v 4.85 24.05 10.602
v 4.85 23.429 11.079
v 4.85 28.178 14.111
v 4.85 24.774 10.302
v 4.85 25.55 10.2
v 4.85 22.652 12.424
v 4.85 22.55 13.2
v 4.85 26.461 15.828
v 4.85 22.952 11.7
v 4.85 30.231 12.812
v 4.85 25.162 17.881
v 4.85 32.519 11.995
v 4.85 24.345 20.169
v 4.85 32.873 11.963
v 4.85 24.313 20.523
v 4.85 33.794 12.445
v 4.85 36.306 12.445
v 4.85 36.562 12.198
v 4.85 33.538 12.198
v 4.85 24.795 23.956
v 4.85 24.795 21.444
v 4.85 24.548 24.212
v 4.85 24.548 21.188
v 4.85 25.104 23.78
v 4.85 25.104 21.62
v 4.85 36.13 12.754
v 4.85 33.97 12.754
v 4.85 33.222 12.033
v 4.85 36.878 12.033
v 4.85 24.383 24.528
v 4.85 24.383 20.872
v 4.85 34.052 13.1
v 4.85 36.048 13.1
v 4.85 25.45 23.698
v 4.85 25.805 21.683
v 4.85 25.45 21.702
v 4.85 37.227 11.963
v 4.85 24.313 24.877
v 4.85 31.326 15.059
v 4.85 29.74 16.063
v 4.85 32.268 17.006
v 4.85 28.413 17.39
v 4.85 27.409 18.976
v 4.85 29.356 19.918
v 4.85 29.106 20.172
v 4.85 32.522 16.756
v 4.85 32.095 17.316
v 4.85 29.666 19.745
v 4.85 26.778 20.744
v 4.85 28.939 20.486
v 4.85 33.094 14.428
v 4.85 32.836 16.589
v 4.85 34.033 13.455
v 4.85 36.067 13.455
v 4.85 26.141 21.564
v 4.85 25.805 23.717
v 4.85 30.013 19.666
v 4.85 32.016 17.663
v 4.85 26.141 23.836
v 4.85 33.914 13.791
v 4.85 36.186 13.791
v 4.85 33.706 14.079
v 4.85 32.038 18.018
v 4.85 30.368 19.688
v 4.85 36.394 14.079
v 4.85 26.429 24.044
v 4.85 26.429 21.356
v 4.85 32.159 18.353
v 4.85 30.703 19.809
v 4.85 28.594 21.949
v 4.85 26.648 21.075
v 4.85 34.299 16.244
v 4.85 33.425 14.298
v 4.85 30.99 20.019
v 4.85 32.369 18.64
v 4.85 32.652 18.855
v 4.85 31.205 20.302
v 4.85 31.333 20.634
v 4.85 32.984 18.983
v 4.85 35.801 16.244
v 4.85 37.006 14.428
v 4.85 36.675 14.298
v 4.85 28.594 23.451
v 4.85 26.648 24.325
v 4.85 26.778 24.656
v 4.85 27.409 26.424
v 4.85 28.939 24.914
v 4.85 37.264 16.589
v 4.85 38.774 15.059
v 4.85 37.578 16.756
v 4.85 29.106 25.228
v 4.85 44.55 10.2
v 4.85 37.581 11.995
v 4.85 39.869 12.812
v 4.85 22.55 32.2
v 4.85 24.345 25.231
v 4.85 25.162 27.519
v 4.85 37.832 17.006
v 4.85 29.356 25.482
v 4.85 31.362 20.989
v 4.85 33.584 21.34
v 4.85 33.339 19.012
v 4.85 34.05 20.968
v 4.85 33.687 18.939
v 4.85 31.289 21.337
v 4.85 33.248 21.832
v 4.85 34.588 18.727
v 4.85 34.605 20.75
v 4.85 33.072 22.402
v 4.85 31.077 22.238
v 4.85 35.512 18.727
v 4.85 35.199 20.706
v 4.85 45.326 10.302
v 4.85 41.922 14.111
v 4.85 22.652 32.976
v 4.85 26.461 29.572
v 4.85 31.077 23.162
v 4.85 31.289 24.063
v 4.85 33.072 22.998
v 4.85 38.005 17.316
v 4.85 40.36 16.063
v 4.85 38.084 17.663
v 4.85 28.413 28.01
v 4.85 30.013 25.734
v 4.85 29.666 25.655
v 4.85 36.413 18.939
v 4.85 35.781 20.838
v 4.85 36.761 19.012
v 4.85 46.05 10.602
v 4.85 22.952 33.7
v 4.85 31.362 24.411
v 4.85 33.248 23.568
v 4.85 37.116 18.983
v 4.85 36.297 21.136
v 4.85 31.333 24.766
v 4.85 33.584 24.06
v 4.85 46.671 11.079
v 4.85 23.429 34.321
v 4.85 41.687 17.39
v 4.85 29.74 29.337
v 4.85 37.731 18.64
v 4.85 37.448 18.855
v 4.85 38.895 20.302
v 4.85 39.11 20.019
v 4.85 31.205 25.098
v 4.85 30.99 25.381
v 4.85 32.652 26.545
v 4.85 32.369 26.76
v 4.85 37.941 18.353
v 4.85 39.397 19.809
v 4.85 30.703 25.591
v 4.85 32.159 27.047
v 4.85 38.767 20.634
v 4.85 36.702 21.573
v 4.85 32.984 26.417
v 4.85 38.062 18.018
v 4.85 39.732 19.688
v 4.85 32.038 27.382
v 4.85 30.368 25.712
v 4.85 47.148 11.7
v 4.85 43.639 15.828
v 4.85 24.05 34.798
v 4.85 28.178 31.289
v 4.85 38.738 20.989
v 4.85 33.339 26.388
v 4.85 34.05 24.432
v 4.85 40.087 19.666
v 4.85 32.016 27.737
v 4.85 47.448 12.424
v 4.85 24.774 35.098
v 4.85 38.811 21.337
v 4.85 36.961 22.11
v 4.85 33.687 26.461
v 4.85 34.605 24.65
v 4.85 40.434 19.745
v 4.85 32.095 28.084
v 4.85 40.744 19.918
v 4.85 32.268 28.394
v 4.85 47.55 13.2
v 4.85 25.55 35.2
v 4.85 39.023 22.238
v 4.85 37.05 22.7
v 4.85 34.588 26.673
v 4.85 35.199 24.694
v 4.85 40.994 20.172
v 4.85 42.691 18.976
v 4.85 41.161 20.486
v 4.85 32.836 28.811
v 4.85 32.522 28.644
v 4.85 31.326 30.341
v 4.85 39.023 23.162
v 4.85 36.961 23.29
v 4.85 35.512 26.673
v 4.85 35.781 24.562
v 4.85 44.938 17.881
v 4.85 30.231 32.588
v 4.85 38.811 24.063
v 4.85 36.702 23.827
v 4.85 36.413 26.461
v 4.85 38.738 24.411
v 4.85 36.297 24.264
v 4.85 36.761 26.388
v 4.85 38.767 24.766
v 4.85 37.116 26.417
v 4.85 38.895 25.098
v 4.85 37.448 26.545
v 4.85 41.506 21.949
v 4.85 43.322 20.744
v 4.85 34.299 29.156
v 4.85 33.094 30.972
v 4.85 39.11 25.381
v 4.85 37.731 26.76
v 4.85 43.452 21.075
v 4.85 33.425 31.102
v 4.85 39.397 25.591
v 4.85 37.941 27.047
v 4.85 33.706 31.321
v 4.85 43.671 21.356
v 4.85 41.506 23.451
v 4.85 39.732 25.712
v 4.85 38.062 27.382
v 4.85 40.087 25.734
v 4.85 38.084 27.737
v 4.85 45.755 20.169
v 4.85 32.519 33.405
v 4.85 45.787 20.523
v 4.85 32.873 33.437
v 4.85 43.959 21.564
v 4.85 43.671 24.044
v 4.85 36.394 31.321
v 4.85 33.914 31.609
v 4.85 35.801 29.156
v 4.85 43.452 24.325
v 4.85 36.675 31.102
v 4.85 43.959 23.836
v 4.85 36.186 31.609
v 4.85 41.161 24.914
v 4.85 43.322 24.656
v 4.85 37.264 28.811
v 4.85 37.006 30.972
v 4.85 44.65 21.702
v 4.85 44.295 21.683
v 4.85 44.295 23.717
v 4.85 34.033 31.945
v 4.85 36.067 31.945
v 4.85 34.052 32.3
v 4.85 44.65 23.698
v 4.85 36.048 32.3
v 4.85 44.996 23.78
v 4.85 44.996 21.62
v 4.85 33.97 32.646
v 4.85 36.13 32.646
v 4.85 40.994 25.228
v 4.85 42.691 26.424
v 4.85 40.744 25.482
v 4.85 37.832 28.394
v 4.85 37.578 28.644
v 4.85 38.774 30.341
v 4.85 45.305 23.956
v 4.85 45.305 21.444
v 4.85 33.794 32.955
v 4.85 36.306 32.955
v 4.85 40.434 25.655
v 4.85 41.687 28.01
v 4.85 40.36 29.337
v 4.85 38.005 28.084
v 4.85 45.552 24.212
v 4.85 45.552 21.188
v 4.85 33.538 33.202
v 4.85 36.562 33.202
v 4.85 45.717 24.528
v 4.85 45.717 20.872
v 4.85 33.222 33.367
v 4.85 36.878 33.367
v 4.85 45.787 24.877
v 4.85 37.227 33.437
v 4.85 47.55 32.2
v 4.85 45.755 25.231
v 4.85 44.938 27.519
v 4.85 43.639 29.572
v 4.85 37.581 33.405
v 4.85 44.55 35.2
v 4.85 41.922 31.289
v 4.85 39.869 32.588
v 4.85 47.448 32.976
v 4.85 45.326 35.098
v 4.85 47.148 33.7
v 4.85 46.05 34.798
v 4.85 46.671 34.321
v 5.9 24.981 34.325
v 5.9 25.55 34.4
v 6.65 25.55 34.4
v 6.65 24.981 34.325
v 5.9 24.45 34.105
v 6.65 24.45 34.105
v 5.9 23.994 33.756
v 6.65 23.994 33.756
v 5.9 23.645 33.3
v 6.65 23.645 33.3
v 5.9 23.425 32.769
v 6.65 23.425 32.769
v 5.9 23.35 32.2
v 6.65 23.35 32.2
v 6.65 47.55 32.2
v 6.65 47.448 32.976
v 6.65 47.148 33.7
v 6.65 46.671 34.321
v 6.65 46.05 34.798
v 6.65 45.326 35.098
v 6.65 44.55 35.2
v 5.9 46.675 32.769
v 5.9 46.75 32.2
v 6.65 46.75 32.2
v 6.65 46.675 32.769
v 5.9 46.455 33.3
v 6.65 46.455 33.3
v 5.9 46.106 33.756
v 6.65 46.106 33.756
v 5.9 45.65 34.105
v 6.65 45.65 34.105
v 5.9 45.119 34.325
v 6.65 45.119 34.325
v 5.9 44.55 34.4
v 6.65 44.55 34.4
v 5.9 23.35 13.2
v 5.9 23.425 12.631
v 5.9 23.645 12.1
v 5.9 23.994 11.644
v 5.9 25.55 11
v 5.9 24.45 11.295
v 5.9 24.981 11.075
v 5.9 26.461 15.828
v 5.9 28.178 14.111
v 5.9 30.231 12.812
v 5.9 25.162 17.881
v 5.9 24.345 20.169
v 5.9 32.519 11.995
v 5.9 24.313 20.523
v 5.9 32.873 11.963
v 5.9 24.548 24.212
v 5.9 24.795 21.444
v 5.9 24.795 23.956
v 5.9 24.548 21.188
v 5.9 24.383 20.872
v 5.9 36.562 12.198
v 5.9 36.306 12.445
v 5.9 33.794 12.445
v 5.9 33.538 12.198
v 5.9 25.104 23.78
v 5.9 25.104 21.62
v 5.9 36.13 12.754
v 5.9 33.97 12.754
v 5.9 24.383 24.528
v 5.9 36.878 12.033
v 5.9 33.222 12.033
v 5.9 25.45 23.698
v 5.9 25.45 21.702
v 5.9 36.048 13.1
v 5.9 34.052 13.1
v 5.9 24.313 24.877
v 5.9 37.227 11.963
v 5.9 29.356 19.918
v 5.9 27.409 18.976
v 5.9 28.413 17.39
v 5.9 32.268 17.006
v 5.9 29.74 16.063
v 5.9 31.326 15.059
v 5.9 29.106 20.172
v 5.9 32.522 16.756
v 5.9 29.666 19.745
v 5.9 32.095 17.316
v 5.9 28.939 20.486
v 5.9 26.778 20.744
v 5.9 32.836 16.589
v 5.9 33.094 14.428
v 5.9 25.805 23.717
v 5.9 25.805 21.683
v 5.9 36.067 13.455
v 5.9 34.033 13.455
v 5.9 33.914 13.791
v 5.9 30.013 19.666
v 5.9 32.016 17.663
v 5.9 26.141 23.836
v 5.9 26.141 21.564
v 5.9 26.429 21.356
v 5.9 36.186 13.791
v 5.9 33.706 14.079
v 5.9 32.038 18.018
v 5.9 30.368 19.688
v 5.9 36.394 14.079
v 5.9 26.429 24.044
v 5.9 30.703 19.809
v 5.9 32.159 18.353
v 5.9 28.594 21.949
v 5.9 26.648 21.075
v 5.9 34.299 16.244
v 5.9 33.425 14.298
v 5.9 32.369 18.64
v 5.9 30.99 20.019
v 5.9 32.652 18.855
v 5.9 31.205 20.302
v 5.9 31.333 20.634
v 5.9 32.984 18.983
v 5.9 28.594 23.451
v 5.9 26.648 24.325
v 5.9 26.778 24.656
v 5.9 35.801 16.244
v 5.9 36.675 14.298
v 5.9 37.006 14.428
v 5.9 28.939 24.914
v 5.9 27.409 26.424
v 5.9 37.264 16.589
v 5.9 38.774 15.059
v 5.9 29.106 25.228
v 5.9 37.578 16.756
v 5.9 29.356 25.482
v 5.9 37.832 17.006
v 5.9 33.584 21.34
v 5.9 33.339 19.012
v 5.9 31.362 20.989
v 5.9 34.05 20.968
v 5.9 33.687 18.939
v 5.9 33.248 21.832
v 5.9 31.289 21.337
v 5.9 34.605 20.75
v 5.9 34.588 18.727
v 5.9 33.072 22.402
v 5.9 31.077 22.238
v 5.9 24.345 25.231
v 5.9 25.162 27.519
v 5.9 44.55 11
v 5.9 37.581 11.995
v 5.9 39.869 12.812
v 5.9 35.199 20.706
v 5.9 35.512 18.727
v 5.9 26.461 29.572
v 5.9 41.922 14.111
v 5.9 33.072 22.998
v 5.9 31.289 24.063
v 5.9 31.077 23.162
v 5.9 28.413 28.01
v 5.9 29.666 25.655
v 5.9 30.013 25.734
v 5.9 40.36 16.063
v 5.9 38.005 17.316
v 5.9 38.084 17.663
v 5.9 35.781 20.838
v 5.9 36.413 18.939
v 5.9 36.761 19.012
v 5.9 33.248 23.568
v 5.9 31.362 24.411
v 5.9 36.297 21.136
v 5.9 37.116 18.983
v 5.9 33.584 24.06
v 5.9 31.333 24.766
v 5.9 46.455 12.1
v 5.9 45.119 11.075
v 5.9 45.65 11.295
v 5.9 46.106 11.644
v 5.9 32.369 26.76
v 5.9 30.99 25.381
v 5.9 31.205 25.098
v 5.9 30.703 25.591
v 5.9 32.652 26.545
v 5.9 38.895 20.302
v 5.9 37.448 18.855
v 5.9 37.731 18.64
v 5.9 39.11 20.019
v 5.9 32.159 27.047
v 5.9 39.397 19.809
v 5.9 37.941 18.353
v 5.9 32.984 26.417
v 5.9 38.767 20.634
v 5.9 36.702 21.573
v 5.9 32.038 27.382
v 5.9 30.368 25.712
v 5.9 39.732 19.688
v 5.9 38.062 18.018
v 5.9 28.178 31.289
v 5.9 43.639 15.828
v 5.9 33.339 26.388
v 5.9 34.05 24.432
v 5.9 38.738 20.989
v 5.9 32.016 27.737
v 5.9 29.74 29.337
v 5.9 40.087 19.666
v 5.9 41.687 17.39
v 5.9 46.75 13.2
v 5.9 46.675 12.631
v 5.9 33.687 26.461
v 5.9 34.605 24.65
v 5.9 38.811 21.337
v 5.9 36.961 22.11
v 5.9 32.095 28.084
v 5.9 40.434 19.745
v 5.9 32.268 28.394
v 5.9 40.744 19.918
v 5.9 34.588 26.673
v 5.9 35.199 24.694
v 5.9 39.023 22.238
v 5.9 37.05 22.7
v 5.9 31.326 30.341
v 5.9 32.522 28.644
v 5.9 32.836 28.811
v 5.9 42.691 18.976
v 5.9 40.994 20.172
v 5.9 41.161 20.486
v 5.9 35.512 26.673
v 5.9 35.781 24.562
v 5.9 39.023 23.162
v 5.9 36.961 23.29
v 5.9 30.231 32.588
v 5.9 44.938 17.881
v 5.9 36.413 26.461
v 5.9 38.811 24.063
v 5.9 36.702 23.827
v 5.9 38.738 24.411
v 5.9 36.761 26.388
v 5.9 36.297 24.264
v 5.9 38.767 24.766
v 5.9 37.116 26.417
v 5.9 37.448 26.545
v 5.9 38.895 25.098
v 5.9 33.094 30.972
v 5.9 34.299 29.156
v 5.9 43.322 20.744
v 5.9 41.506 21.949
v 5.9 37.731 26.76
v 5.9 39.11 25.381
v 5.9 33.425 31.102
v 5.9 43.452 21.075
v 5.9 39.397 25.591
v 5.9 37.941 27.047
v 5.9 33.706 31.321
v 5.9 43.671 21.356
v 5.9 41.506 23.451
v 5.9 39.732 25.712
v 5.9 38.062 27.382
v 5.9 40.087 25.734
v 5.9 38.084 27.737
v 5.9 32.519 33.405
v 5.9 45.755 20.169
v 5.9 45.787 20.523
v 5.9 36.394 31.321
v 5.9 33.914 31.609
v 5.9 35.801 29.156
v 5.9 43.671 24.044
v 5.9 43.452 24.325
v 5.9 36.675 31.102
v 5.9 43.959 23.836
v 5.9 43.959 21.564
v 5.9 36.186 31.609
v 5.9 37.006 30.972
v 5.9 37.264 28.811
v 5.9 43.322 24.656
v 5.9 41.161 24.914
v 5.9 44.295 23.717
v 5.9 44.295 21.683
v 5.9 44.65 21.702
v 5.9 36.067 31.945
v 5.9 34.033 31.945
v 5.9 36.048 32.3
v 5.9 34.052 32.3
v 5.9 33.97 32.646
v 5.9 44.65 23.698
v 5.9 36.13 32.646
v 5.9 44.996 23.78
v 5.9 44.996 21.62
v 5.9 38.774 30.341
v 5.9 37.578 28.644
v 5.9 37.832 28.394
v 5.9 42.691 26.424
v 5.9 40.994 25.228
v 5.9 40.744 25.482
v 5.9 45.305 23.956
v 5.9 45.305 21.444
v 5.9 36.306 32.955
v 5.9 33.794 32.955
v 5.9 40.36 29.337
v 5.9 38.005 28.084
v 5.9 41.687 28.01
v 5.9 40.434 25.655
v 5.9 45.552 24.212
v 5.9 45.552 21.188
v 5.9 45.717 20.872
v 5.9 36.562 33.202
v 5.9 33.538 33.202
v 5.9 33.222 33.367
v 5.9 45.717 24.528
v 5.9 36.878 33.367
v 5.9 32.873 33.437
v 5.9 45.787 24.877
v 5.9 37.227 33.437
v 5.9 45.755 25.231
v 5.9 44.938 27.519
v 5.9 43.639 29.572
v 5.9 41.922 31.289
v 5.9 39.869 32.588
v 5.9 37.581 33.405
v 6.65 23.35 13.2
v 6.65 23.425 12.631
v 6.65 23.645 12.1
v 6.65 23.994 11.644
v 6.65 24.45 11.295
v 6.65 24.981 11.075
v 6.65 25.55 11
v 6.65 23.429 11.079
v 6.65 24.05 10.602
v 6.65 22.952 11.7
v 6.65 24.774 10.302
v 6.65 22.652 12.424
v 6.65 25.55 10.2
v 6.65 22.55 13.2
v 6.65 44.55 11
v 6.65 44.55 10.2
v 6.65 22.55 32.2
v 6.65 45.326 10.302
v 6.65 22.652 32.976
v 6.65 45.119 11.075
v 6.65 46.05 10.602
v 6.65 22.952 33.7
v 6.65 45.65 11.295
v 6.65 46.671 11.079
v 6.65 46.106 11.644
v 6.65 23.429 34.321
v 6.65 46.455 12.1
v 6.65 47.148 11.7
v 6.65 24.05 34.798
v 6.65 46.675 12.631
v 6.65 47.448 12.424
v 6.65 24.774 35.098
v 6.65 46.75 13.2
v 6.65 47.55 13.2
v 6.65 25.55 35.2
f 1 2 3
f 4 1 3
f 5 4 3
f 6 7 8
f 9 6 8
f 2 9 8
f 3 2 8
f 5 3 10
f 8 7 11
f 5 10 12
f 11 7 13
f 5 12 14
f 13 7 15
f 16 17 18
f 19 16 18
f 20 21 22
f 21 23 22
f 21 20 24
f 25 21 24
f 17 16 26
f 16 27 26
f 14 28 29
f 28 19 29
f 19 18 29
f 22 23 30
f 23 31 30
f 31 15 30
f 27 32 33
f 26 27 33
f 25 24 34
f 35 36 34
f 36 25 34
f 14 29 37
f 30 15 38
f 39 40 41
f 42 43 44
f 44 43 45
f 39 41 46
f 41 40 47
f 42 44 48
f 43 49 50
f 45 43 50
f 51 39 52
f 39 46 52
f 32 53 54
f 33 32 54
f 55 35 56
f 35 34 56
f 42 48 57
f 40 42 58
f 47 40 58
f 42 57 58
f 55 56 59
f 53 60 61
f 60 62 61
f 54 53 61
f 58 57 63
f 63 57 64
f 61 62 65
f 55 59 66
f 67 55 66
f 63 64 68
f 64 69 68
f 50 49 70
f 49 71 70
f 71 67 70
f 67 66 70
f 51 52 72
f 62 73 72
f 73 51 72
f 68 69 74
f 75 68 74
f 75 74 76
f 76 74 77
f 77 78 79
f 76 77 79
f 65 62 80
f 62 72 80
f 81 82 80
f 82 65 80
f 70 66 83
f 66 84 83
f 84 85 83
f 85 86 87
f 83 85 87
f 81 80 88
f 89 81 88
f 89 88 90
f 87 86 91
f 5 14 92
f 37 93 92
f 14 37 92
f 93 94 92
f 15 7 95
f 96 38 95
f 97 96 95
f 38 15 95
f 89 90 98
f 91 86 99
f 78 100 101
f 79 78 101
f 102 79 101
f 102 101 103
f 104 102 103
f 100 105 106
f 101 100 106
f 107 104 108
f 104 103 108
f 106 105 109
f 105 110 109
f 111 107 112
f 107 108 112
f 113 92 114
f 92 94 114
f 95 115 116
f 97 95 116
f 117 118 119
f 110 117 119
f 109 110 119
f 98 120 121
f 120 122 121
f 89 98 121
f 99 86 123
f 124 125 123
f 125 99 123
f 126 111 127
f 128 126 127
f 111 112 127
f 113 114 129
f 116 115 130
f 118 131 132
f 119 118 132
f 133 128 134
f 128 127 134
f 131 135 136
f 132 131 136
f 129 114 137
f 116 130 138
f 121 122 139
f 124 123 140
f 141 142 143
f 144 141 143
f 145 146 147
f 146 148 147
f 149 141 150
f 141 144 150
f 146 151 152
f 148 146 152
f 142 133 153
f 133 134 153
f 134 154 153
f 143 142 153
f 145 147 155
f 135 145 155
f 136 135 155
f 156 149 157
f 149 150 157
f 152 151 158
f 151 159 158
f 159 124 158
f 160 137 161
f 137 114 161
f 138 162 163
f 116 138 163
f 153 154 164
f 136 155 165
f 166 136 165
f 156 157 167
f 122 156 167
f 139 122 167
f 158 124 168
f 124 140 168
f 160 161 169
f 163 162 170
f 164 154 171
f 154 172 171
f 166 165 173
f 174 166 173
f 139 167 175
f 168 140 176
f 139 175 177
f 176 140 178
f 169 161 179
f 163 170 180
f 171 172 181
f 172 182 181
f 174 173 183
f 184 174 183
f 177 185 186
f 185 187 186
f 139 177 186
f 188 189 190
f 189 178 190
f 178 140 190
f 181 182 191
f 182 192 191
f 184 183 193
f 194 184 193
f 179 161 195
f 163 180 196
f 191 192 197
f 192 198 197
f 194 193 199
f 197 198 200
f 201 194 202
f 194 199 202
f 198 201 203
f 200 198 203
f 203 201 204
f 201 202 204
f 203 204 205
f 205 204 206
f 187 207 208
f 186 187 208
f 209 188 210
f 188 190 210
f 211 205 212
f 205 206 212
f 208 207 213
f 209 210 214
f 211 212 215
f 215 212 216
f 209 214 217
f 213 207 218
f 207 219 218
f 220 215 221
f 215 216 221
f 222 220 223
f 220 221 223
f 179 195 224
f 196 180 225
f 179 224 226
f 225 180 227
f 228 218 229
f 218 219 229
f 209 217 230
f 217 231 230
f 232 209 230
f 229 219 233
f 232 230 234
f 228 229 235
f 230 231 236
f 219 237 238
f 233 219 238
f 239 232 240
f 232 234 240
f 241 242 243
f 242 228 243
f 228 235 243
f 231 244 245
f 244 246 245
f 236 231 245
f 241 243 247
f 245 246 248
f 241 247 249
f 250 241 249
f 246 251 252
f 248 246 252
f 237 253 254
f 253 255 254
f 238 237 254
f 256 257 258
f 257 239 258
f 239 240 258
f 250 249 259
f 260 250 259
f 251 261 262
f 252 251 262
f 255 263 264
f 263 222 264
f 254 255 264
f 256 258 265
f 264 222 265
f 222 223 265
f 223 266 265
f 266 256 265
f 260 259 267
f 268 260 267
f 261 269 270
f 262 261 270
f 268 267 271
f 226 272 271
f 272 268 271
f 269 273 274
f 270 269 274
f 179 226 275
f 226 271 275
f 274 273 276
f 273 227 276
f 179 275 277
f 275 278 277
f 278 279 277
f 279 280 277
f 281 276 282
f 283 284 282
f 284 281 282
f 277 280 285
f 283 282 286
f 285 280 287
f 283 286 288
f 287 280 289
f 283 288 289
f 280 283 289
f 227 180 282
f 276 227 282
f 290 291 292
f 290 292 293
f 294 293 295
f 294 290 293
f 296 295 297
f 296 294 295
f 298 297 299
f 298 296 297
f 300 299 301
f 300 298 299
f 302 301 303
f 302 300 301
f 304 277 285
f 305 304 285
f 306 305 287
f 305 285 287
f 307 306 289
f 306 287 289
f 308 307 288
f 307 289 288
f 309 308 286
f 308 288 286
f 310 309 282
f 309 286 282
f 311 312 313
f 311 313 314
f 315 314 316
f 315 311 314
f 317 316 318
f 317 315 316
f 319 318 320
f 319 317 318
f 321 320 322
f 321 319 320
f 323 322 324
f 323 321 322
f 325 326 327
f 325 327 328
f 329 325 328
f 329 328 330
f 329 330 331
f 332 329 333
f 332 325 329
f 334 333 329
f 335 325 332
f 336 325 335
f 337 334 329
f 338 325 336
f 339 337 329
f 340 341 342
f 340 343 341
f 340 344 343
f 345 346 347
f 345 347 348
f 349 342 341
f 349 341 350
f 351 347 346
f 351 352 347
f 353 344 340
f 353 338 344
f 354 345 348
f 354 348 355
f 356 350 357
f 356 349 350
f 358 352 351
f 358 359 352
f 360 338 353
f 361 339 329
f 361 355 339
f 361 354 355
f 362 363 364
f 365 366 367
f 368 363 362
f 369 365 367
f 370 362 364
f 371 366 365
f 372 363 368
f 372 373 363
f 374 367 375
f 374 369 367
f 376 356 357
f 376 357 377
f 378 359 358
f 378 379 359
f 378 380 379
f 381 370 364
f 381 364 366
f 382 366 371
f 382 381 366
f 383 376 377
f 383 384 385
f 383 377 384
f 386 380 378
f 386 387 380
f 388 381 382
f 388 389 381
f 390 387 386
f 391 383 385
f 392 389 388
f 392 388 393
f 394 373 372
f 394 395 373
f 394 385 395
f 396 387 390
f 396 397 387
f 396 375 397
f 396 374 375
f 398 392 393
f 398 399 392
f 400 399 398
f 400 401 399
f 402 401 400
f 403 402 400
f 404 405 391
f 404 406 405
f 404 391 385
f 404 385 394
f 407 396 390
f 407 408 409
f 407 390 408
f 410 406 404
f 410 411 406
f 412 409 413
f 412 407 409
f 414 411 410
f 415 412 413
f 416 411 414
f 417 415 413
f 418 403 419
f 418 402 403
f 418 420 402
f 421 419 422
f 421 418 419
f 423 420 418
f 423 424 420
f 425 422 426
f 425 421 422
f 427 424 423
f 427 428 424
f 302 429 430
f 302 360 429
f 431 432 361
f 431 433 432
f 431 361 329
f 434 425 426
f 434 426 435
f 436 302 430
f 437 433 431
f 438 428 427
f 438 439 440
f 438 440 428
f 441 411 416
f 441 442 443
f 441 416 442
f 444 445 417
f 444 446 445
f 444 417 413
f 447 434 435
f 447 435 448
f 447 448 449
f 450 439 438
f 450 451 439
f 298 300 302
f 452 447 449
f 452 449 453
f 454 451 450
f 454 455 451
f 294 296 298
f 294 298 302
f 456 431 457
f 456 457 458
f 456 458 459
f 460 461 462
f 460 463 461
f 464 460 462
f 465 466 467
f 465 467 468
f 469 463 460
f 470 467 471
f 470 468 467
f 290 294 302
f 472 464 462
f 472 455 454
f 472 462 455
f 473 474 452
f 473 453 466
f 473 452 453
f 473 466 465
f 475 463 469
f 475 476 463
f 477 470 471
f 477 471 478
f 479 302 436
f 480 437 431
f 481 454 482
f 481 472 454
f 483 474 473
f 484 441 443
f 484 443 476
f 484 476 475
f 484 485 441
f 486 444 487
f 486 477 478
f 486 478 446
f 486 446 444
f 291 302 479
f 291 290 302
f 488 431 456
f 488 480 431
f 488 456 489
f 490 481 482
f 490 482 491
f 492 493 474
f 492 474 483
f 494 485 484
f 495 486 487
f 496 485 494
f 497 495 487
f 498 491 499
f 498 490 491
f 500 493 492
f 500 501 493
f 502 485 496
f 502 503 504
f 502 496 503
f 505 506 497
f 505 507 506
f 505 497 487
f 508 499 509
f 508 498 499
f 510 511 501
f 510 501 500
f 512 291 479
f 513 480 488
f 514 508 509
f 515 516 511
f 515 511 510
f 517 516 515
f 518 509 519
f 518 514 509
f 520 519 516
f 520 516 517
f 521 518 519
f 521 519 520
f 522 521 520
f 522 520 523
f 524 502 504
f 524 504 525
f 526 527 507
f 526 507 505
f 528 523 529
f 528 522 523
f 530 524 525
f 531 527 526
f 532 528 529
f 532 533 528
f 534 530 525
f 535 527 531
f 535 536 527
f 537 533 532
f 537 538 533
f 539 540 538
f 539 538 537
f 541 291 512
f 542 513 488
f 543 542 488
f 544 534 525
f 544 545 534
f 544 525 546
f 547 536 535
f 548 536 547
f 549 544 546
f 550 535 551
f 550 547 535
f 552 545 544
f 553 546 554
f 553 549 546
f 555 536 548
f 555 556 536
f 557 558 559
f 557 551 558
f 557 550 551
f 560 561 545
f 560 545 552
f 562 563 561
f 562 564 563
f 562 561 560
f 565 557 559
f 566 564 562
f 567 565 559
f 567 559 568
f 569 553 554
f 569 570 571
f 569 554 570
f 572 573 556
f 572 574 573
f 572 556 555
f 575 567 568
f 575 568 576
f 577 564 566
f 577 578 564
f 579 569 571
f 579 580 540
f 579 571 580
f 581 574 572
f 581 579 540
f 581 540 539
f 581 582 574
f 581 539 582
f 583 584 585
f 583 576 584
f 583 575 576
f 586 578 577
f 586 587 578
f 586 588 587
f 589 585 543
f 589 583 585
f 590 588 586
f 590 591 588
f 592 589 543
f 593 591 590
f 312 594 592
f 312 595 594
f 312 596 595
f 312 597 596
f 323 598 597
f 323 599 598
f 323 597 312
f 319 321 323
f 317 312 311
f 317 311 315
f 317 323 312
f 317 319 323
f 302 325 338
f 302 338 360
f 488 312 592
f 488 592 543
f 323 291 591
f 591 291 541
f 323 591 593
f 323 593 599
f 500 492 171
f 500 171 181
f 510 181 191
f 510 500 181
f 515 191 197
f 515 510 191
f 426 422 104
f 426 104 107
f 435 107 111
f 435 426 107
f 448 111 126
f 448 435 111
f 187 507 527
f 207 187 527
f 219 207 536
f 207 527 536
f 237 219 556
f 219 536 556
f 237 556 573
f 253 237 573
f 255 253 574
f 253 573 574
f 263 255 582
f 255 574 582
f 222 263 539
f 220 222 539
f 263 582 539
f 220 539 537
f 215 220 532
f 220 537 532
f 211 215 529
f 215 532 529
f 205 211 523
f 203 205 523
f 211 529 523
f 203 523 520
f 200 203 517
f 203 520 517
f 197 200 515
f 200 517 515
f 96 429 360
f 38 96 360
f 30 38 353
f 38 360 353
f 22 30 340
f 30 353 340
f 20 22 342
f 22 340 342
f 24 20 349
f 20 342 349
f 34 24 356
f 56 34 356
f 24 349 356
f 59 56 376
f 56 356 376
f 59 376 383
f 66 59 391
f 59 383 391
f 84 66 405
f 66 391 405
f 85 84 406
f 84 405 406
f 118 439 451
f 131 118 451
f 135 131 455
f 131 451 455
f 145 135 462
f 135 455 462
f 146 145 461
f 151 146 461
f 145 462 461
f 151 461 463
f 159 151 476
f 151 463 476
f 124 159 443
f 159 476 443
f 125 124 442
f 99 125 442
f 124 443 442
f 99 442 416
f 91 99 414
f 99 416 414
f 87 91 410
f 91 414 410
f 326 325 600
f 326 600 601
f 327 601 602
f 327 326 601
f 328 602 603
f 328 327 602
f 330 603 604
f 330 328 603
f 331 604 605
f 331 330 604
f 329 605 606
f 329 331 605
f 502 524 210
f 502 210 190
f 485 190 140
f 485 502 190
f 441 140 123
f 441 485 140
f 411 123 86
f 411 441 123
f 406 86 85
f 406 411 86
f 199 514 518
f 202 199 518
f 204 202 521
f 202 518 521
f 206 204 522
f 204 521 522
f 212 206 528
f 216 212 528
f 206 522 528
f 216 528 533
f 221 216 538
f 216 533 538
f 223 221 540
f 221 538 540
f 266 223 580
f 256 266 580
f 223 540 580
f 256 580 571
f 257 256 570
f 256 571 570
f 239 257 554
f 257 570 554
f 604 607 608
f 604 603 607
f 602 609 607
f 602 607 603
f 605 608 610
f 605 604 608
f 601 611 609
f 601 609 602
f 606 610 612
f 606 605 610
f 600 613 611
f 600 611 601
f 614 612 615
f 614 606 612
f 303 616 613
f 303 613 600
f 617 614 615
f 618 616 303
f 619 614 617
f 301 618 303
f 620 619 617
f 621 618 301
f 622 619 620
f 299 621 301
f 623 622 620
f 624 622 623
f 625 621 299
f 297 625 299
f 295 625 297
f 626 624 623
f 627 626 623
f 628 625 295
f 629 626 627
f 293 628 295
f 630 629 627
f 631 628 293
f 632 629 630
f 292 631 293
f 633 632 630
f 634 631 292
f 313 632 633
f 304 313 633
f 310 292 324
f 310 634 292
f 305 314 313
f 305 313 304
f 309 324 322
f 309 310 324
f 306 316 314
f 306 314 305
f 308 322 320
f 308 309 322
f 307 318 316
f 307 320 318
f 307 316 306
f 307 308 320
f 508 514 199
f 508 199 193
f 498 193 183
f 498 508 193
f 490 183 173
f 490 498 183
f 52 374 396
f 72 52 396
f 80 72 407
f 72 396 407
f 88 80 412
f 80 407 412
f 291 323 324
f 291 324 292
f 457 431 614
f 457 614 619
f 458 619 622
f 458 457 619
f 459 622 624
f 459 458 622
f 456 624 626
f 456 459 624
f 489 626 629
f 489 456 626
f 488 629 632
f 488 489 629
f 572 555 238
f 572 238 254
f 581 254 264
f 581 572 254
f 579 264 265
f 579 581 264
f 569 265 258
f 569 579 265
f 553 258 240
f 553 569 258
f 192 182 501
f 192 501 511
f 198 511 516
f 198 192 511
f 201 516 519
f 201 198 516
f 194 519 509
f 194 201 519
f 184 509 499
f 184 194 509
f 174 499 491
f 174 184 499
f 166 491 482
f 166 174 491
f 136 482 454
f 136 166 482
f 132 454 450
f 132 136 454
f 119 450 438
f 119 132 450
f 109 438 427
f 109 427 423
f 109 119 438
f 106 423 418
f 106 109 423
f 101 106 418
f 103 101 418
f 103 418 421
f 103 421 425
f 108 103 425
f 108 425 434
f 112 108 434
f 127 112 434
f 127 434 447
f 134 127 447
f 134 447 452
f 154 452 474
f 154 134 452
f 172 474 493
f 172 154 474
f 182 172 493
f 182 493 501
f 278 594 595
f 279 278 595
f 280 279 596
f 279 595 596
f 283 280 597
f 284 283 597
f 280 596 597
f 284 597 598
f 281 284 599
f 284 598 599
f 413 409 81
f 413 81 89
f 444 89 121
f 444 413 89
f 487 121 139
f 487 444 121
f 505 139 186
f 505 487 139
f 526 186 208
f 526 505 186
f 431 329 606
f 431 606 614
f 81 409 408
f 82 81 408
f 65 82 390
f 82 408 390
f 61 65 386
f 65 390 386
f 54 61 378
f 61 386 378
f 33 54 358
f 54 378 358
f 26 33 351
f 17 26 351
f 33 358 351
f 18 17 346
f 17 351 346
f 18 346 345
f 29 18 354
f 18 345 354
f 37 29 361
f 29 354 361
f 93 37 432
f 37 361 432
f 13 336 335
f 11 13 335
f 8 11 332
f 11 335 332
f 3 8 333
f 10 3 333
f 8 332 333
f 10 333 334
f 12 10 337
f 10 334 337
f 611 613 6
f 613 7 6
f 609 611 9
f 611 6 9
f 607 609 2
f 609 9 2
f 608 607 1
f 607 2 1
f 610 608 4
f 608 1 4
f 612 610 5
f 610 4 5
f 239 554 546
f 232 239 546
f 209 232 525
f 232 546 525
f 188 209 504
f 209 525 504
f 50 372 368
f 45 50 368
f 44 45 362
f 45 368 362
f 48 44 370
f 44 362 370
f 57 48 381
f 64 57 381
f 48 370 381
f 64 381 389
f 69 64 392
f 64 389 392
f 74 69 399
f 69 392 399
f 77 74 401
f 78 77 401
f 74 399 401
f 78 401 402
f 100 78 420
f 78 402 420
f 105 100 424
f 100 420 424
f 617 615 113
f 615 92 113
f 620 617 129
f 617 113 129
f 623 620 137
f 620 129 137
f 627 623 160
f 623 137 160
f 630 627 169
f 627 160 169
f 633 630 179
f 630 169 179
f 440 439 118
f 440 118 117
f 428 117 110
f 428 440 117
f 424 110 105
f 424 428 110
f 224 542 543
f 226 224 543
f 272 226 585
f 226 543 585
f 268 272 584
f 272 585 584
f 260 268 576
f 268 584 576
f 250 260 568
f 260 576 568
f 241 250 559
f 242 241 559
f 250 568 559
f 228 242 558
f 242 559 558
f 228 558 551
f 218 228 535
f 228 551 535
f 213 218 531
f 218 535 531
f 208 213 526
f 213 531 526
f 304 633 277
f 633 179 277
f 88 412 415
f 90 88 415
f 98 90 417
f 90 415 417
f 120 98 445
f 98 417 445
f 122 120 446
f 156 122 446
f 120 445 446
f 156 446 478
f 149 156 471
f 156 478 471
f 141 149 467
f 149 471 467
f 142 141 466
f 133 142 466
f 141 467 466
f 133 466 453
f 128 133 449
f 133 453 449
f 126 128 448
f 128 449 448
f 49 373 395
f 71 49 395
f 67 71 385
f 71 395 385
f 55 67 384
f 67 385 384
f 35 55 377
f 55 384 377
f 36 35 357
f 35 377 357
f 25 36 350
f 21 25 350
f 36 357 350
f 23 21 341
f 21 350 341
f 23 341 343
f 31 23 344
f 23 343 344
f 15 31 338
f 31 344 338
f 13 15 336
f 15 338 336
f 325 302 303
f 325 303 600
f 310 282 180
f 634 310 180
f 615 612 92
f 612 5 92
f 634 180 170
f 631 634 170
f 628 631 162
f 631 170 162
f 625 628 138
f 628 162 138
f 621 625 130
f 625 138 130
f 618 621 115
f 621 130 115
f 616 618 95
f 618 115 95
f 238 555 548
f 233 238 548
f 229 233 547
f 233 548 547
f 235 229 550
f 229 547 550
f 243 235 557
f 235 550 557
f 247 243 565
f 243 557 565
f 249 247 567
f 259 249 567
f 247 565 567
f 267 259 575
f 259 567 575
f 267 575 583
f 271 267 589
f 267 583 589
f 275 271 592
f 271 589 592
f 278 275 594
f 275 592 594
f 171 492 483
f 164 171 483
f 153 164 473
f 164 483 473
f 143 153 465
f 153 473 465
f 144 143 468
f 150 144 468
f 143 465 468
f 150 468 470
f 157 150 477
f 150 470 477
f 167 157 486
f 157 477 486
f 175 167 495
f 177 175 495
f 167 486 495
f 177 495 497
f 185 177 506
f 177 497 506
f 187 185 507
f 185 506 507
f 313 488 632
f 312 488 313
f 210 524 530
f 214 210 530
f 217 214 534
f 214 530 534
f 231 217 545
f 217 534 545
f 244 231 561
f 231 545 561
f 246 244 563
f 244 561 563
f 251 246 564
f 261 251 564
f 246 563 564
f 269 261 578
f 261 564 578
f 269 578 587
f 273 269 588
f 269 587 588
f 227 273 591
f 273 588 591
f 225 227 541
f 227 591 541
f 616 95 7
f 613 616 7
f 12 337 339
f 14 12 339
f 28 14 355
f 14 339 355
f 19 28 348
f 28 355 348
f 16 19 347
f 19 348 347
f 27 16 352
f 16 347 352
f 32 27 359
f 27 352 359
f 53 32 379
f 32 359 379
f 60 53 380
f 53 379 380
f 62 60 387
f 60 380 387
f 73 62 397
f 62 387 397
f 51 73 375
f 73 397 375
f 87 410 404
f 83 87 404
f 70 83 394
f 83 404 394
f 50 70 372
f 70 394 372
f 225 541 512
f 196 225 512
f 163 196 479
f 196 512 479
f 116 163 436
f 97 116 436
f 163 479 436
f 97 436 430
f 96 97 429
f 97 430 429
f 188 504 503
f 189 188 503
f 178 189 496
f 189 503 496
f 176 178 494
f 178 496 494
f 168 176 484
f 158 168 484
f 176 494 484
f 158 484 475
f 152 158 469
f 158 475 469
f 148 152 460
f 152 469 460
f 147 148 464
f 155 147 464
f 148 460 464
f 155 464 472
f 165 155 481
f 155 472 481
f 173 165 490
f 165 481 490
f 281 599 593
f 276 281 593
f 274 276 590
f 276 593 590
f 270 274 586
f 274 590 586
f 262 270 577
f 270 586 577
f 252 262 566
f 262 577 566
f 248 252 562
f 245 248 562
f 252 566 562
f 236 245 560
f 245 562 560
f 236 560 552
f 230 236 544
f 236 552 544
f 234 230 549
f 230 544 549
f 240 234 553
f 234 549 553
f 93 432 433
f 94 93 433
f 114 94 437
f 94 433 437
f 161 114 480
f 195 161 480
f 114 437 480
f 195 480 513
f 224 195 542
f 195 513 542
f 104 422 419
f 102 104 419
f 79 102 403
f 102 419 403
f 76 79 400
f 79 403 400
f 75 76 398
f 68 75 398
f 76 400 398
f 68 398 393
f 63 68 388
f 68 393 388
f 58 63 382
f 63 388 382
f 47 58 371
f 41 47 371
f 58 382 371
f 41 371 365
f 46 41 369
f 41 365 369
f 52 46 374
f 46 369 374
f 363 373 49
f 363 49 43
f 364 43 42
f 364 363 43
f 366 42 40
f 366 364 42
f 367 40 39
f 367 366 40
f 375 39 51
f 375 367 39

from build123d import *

# Parameters (mm, degrees)
SKETCH028_R           = 2
PAD011_DEPTH          = 1.05
POCKET023_DEPTH       = 71.792855
POLARPATTERN_COUNT    = 4
POCKET024_DEPTH       = 71.792855
POLARPATTERN001_COUNT = 4
PAD012_DEPTH          = 0.75


with BuildPart() as part:
    # Sketch028 → Pad011 (new body)
    with BuildSketch(Plane.YZ):
        with BuildLine():
            Line((-12.5, 9.5), (-12.5, -9.5))
            ThreePointArc((-12.5, -9.5), (-11.62132, -11.62132), (-9.5, -12.5))
            Line((-9.5, -12.5), (9.5, -12.5))
            ThreePointArc((9.5, -12.5), (11.62132, -11.62132), (12.5, -9.5))
            Line((12.5, -9.5), (12.5, 9.5))
            ThreePointArc((12.5, 9.5), (11.62132, 11.62132), (9.5, 12.5))
            Line((9.5, 12.5), (-9.5, 12.5))
            ThreePointArc((-9.5, 12.5), (-11.62132, 11.62132), (-12.5, 9.5))
        make_face()
        Circle(SKETCH028_R, mode=Mode.SUBTRACT)
    extrude(amount=PAD011_DEPTH)

    # Sketch029 (on Face11 of Pad011) → Pocket023 (cut, through all)
    with BuildSketch(Plane.YZ.offset(1.05)):
        with BuildLine():
            ThreePointArc((1.362563, 3.760774), (0, 4), (-1.362563, 3.760774))
            ThreePointArc((-2.214165, 6.111258), (-2.963606, 4.510215), (-1.362563, 3.760774))
            ThreePointArc((2.214165, 6.111258), (0, 6.5), (-2.214165, 6.111258))
            ThreePointArc((1.362563, 3.760774), (2.963606, 4.510215), (2.214165, 6.111258))
        make_face()
    pocket023 = extrude(amount=-POCKET023_DEPTH, mode=Mode.SUBTRACT)

    # PolarPattern: Pocket023 ×4 about axis
    polarpattern_axis = Axis((1.05, 0, 0), (1, 0, 0))
    for i in range(1, POLARPATTERN_COUNT):
        add(pocket023.rotate(polarpattern_axis, i * 360 / POLARPATTERN_COUNT), mode=Mode.SUBTRACT)

    # Sketch030 (on Face5 of PolarPattern) → Pocket024 (cut, through all)
    with BuildSketch(Plane.YZ.offset(1.05)):
        with BuildLine():
            ThreePointArc((-1.955695, 8.271956), (-6.010408, 6.010408), (-8.271956, 1.955695))
            ThreePointArc((-10.704884, 2.5309), (-9.776022, 1.026833), (-8.271956, 1.955695))
            ThreePointArc((-2.5309, 10.704884), (-7.778175, 7.778175), (-10.704884, 2.5309))
            ThreePointArc((-1.955695, 8.271956), (-1.026833, 9.776022), (-2.5309, 10.704884))
        make_face()
    pocket024 = extrude(amount=-POCKET024_DEPTH, mode=Mode.SUBTRACT)

    # PolarPattern001: Pocket024 ×4 about axis
    polarpattern001_axis = Axis((1.05, 0, 0), (1, 0, 0))
    for i in range(1, POLARPATTERN001_COUNT):
        add(pocket024.rotate(polarpattern001_axis, i * 360 / POLARPATTERN001_COUNT), mode=Mode.SUBTRACT)

    # Sketch031 (on Face5 of PolarPattern001) → Pad012 (join)
    with BuildSketch(Plane.YZ.offset(1.05)):
        with BuildLine():
            Line((-12.5, 9.5), (-12.5, -9.5))
            ThreePointArc((-12.5, -9.5), (-11.62132, -11.62132), (-9.5, -12.5))
            Line((-9.5, -12.5), (9.5, -12.5))
            ThreePointArc((9.5, -12.5), (11.62132, -11.62132), (12.5, -9.5))
            Line((12.5, -9.5), (12.5, 9.5))
            ThreePointArc((12.5, 9.5), (11.62132, 11.62132), (9.5, 12.5))
            Line((9.5, 12.5), (-9.5, 12.5))
            ThreePointArc((-9.5, 12.5), (-11.62132, 11.62132), (-12.5, 9.5))
        make_face()
        with BuildLine():
            Line((-11.7, 9.5), (-11.7, -9.5))
            ThreePointArc((-11.7, -9.5), (-11.055635, -11.055635), (-9.5, -11.7))
            Line((-9.5, -11.7), (9.5, -11.7))
            ThreePointArc((9.5, -11.7), (11.055635, -11.055635), (11.7, -9.5))
            Line((11.7, -9.5), (11.7, 9.5))
            ThreePointArc((11.7, 9.5), (11.055635, 11.055635), (9.5, 11.7))
            Line((9.5, 11.7), (-9.5, 11.7))
            ThreePointArc((-9.5, 11.7), (-11.055635, 11.055635), (-11.7, 9.5))
        make_face(mode=Mode.SUBTRACT)
    extrude(amount=PAD012_DEPTH)


with BuildPart() as part_1:
    # Body009 placement: moved
    add(part.part.moved(Location((4.85, 35.05, 22.7))))


solid = part_1.part
